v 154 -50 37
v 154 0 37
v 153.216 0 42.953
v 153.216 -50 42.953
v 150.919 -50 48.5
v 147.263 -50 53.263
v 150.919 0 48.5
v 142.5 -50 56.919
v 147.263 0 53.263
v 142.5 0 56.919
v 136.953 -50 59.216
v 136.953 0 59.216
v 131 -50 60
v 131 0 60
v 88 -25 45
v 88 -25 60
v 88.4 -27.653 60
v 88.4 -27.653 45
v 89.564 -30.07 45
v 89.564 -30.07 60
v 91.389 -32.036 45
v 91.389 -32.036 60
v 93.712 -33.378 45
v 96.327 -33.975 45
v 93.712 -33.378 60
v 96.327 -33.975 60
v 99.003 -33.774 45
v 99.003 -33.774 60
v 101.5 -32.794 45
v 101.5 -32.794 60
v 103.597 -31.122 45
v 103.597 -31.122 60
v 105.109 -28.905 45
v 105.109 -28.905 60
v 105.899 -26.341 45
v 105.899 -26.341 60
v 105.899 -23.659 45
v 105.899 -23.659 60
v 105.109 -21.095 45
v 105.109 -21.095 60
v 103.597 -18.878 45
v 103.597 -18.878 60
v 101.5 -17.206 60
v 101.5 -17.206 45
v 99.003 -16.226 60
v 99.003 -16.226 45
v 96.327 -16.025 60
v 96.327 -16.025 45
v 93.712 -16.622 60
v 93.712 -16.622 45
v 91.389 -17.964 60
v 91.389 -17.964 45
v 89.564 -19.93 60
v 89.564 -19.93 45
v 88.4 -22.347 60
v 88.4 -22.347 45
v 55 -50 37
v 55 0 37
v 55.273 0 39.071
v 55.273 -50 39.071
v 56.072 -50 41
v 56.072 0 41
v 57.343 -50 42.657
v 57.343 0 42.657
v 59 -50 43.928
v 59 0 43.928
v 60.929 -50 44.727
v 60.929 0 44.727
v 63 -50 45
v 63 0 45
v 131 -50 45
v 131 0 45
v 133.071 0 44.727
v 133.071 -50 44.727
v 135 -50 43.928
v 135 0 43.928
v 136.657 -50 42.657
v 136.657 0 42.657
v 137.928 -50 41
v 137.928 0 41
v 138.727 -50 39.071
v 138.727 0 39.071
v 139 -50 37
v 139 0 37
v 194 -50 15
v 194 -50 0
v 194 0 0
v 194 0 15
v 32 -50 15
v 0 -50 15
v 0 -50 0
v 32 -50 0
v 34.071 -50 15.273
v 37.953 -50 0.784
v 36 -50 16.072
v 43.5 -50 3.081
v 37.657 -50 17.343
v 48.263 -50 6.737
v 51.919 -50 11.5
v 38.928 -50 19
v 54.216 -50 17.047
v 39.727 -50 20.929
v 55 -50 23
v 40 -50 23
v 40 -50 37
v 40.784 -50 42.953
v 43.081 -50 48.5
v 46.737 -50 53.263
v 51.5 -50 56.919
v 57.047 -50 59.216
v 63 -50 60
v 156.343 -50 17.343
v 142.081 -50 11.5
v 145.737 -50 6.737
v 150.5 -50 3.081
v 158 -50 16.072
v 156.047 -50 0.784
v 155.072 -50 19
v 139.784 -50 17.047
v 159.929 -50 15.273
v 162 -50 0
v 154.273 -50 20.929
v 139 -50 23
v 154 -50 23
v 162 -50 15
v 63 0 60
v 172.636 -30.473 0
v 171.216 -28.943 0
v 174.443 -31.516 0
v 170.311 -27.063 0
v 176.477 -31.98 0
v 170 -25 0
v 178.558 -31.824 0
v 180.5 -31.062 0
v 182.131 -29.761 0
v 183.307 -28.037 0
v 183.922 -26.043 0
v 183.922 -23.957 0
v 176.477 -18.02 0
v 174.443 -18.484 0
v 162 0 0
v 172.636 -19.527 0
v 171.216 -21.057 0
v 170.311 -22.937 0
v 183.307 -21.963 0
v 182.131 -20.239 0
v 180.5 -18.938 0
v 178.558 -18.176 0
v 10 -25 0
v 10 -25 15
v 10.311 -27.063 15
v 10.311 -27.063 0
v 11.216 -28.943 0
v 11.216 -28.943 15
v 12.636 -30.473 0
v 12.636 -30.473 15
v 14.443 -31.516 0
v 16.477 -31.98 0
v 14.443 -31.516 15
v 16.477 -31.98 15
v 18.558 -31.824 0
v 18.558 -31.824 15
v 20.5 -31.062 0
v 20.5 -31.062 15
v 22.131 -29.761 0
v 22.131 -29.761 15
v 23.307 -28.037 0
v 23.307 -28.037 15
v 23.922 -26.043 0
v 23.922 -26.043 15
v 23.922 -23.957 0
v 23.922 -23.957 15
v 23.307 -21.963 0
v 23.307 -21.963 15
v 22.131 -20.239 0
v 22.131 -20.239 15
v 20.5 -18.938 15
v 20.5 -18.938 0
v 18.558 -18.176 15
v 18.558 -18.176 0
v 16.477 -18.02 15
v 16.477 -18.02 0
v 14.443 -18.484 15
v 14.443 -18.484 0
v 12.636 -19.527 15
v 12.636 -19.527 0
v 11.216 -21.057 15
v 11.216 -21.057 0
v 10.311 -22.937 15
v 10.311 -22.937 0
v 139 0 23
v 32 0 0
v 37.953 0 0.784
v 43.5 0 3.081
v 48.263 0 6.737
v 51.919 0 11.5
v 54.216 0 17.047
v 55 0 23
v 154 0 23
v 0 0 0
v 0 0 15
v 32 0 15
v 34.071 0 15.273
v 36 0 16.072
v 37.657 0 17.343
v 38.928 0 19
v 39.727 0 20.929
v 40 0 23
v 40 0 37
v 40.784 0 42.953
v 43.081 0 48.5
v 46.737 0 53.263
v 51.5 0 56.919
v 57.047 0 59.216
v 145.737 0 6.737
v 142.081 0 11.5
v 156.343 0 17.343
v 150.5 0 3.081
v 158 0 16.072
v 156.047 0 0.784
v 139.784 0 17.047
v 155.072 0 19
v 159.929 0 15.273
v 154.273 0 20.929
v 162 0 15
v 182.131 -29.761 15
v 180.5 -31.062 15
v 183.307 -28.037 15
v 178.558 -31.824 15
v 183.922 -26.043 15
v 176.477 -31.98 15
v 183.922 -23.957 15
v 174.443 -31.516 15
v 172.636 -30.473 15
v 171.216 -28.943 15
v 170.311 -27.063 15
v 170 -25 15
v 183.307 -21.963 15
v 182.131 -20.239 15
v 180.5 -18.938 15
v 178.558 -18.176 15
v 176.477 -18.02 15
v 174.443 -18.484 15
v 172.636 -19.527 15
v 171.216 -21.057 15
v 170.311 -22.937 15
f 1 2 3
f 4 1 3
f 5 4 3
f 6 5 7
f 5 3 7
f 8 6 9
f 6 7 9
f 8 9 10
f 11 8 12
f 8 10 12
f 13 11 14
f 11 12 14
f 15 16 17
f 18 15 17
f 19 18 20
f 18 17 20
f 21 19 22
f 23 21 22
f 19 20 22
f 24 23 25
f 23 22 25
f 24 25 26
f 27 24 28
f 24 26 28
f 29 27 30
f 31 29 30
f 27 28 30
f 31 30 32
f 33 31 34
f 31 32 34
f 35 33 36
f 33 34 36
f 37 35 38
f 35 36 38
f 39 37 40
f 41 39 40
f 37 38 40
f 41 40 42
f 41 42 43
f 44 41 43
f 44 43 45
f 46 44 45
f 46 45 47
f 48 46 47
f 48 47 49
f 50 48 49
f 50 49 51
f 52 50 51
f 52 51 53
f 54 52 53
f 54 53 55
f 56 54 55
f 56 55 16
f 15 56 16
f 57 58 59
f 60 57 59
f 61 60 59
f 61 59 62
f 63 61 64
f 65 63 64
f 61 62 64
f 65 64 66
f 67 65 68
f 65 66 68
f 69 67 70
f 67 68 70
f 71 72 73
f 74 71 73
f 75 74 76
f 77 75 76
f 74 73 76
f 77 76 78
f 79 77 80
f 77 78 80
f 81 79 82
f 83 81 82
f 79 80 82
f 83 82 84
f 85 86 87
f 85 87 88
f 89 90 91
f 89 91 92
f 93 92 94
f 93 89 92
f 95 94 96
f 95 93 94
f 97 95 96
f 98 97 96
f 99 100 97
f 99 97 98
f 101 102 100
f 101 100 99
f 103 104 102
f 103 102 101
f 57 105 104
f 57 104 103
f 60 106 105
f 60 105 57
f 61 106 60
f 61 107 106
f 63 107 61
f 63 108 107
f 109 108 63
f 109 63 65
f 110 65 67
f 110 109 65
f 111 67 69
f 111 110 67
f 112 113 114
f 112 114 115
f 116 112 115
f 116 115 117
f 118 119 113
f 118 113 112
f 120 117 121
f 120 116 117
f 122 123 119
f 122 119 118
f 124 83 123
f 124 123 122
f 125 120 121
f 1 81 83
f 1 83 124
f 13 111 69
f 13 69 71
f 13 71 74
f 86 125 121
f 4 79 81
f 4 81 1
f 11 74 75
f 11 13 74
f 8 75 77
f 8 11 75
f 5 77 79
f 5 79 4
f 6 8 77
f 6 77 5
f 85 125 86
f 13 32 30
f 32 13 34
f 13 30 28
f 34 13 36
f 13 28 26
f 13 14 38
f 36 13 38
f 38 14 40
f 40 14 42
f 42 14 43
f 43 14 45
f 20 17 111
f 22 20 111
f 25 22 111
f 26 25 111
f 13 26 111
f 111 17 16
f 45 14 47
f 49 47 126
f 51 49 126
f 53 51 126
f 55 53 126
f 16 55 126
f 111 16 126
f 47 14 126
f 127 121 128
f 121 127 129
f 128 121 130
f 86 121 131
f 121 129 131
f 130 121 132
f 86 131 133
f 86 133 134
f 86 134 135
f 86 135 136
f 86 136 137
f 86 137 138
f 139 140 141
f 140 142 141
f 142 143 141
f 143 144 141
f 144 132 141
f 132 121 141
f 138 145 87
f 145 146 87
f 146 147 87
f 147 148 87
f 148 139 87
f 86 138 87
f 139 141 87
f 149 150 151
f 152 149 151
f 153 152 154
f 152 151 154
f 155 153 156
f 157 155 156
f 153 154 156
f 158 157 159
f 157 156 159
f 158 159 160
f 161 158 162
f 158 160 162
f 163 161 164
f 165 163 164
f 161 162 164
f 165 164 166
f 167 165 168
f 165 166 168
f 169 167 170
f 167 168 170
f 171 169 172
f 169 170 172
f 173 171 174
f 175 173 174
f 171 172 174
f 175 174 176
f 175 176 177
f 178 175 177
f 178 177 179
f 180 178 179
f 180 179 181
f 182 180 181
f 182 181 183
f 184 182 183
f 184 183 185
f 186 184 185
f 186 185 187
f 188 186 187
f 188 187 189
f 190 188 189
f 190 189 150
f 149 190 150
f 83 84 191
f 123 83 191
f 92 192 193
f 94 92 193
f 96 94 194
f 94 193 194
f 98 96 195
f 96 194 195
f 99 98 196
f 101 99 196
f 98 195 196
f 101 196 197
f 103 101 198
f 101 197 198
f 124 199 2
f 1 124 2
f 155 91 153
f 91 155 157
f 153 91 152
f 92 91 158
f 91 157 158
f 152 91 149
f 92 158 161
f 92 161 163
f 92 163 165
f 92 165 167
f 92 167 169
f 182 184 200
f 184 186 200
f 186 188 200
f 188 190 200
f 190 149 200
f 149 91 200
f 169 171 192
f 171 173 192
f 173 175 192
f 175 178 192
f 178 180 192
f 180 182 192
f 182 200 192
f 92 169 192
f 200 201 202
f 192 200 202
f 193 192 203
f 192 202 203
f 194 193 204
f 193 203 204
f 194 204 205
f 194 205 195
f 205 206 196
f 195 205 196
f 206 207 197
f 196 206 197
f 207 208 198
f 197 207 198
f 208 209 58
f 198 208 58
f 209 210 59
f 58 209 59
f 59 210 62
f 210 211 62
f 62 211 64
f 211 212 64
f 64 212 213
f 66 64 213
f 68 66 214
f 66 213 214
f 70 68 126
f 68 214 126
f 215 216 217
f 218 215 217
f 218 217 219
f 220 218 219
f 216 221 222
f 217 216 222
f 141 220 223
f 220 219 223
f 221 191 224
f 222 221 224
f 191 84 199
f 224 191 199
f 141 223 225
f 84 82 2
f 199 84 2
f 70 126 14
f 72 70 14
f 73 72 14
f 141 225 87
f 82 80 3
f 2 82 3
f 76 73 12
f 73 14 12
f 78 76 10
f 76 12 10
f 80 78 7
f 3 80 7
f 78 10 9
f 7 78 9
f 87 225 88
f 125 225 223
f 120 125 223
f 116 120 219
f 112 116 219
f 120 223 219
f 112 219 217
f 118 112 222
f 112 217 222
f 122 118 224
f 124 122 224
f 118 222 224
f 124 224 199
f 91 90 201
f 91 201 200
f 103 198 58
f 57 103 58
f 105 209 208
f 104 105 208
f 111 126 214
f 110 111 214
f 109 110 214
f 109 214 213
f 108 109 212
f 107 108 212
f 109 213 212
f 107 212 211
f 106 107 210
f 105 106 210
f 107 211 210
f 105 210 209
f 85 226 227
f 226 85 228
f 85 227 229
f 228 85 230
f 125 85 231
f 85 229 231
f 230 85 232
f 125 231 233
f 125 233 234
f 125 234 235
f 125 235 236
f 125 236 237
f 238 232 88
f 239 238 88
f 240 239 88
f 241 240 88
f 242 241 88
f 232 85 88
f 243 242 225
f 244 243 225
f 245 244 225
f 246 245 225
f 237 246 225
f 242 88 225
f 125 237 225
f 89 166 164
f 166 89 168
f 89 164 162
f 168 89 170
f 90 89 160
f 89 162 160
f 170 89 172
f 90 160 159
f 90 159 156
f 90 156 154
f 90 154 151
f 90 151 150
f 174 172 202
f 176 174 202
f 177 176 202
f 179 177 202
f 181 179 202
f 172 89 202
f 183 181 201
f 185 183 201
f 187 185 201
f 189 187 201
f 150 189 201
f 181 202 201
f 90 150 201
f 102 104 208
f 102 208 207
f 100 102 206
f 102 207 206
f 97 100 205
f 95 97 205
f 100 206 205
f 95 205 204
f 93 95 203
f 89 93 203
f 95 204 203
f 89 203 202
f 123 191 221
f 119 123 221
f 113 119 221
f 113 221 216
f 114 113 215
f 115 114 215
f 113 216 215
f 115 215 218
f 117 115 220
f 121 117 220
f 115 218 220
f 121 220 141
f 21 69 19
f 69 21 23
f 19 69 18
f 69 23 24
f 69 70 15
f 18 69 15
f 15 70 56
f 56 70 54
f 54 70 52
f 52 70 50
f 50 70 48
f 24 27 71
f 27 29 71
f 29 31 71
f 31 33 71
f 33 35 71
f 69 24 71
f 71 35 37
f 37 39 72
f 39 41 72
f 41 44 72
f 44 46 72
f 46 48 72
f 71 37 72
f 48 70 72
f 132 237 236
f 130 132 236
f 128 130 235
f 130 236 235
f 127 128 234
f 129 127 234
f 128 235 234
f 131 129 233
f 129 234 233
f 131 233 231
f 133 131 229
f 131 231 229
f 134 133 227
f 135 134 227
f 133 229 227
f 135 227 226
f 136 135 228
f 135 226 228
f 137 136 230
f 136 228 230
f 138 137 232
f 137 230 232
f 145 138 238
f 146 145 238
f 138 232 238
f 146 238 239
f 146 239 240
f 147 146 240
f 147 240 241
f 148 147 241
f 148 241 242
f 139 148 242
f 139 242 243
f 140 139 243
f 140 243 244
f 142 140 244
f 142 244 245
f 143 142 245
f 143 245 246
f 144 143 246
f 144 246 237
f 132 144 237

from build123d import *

# Parameters (mm, degrees)
F1_DEPTH = 50
F5_D     = 18
F6_D     = 14
F7_D     = 14


with BuildPart() as f1:
    # F0 (on Front) → F1 (new body)
    with BuildSketch(Plane.XZ):
        with BuildLine():
            Line((0, 15), (0, 0))
            Line((0, 0), (32, 0))
            ThreePointArc((32, 0), (48.2634559673, 6.7365440327), (55, 23))
            Line((55, 23), (55, 37))
            ThreePointArc((55, 37), (57.3431457505, 42.6568542495), (63, 45))
            Line((63, 45), (131, 45))
            ThreePointArc((131, 45), (136.6568542495, 42.6568542495), (139, 37))
            Line((139, 37), (139, 23))
            ThreePointArc((139, 23), (145.7365440327, 6.7365440327), (162, 0))
            Line((162, 0), (194, 0))
            Line((194, 0), (194, 15))
            Line((194, 15), (162, 15))
            ThreePointArc((162, 15), (156.3431457505, 17.3431457505), (154, 23))
            Line((154, 23), (154, 37))
            ThreePointArc((154, 37), (147.2634559673, 53.2634559673), (131, 60))
            Line((131, 60), (63, 60))
            ThreePointArc((63, 60), (46.7365440327, 53.2634559673), (40, 37))
            Line((40, 37), (40, 23))
            ThreePointArc((40, 23), (37.6568542495, 17.3431457505), (32, 15))
            Line((32, 15), (0, 15))
        make_face()
    extrude(amount=F1_DEPTH)

    # F5 (through all)
    with Locations(Plane(origin=(0, 0, 45), x_dir=(1, 0, 0), z_dir=(0, 0, -1))):
        with Locations((97, 25)):
            Hole(F5_D / 2)

    # F6 (through all)
    with Locations(Plane(origin=(0, 0, 0), x_dir=(1, 0, 0), z_dir=(0, 0, -1))):
        with Locations((17, 25)):
            Hole(F6_D / 2)

    # F7 (through all)
    with Locations(Plane(origin=(0, 0, 0), x_dir=(1, 0, 0), z_dir=(0, 0, -1))):
        with Locations((177, 25)):
            Hole(F7_D / 2)


solid = f1.part
